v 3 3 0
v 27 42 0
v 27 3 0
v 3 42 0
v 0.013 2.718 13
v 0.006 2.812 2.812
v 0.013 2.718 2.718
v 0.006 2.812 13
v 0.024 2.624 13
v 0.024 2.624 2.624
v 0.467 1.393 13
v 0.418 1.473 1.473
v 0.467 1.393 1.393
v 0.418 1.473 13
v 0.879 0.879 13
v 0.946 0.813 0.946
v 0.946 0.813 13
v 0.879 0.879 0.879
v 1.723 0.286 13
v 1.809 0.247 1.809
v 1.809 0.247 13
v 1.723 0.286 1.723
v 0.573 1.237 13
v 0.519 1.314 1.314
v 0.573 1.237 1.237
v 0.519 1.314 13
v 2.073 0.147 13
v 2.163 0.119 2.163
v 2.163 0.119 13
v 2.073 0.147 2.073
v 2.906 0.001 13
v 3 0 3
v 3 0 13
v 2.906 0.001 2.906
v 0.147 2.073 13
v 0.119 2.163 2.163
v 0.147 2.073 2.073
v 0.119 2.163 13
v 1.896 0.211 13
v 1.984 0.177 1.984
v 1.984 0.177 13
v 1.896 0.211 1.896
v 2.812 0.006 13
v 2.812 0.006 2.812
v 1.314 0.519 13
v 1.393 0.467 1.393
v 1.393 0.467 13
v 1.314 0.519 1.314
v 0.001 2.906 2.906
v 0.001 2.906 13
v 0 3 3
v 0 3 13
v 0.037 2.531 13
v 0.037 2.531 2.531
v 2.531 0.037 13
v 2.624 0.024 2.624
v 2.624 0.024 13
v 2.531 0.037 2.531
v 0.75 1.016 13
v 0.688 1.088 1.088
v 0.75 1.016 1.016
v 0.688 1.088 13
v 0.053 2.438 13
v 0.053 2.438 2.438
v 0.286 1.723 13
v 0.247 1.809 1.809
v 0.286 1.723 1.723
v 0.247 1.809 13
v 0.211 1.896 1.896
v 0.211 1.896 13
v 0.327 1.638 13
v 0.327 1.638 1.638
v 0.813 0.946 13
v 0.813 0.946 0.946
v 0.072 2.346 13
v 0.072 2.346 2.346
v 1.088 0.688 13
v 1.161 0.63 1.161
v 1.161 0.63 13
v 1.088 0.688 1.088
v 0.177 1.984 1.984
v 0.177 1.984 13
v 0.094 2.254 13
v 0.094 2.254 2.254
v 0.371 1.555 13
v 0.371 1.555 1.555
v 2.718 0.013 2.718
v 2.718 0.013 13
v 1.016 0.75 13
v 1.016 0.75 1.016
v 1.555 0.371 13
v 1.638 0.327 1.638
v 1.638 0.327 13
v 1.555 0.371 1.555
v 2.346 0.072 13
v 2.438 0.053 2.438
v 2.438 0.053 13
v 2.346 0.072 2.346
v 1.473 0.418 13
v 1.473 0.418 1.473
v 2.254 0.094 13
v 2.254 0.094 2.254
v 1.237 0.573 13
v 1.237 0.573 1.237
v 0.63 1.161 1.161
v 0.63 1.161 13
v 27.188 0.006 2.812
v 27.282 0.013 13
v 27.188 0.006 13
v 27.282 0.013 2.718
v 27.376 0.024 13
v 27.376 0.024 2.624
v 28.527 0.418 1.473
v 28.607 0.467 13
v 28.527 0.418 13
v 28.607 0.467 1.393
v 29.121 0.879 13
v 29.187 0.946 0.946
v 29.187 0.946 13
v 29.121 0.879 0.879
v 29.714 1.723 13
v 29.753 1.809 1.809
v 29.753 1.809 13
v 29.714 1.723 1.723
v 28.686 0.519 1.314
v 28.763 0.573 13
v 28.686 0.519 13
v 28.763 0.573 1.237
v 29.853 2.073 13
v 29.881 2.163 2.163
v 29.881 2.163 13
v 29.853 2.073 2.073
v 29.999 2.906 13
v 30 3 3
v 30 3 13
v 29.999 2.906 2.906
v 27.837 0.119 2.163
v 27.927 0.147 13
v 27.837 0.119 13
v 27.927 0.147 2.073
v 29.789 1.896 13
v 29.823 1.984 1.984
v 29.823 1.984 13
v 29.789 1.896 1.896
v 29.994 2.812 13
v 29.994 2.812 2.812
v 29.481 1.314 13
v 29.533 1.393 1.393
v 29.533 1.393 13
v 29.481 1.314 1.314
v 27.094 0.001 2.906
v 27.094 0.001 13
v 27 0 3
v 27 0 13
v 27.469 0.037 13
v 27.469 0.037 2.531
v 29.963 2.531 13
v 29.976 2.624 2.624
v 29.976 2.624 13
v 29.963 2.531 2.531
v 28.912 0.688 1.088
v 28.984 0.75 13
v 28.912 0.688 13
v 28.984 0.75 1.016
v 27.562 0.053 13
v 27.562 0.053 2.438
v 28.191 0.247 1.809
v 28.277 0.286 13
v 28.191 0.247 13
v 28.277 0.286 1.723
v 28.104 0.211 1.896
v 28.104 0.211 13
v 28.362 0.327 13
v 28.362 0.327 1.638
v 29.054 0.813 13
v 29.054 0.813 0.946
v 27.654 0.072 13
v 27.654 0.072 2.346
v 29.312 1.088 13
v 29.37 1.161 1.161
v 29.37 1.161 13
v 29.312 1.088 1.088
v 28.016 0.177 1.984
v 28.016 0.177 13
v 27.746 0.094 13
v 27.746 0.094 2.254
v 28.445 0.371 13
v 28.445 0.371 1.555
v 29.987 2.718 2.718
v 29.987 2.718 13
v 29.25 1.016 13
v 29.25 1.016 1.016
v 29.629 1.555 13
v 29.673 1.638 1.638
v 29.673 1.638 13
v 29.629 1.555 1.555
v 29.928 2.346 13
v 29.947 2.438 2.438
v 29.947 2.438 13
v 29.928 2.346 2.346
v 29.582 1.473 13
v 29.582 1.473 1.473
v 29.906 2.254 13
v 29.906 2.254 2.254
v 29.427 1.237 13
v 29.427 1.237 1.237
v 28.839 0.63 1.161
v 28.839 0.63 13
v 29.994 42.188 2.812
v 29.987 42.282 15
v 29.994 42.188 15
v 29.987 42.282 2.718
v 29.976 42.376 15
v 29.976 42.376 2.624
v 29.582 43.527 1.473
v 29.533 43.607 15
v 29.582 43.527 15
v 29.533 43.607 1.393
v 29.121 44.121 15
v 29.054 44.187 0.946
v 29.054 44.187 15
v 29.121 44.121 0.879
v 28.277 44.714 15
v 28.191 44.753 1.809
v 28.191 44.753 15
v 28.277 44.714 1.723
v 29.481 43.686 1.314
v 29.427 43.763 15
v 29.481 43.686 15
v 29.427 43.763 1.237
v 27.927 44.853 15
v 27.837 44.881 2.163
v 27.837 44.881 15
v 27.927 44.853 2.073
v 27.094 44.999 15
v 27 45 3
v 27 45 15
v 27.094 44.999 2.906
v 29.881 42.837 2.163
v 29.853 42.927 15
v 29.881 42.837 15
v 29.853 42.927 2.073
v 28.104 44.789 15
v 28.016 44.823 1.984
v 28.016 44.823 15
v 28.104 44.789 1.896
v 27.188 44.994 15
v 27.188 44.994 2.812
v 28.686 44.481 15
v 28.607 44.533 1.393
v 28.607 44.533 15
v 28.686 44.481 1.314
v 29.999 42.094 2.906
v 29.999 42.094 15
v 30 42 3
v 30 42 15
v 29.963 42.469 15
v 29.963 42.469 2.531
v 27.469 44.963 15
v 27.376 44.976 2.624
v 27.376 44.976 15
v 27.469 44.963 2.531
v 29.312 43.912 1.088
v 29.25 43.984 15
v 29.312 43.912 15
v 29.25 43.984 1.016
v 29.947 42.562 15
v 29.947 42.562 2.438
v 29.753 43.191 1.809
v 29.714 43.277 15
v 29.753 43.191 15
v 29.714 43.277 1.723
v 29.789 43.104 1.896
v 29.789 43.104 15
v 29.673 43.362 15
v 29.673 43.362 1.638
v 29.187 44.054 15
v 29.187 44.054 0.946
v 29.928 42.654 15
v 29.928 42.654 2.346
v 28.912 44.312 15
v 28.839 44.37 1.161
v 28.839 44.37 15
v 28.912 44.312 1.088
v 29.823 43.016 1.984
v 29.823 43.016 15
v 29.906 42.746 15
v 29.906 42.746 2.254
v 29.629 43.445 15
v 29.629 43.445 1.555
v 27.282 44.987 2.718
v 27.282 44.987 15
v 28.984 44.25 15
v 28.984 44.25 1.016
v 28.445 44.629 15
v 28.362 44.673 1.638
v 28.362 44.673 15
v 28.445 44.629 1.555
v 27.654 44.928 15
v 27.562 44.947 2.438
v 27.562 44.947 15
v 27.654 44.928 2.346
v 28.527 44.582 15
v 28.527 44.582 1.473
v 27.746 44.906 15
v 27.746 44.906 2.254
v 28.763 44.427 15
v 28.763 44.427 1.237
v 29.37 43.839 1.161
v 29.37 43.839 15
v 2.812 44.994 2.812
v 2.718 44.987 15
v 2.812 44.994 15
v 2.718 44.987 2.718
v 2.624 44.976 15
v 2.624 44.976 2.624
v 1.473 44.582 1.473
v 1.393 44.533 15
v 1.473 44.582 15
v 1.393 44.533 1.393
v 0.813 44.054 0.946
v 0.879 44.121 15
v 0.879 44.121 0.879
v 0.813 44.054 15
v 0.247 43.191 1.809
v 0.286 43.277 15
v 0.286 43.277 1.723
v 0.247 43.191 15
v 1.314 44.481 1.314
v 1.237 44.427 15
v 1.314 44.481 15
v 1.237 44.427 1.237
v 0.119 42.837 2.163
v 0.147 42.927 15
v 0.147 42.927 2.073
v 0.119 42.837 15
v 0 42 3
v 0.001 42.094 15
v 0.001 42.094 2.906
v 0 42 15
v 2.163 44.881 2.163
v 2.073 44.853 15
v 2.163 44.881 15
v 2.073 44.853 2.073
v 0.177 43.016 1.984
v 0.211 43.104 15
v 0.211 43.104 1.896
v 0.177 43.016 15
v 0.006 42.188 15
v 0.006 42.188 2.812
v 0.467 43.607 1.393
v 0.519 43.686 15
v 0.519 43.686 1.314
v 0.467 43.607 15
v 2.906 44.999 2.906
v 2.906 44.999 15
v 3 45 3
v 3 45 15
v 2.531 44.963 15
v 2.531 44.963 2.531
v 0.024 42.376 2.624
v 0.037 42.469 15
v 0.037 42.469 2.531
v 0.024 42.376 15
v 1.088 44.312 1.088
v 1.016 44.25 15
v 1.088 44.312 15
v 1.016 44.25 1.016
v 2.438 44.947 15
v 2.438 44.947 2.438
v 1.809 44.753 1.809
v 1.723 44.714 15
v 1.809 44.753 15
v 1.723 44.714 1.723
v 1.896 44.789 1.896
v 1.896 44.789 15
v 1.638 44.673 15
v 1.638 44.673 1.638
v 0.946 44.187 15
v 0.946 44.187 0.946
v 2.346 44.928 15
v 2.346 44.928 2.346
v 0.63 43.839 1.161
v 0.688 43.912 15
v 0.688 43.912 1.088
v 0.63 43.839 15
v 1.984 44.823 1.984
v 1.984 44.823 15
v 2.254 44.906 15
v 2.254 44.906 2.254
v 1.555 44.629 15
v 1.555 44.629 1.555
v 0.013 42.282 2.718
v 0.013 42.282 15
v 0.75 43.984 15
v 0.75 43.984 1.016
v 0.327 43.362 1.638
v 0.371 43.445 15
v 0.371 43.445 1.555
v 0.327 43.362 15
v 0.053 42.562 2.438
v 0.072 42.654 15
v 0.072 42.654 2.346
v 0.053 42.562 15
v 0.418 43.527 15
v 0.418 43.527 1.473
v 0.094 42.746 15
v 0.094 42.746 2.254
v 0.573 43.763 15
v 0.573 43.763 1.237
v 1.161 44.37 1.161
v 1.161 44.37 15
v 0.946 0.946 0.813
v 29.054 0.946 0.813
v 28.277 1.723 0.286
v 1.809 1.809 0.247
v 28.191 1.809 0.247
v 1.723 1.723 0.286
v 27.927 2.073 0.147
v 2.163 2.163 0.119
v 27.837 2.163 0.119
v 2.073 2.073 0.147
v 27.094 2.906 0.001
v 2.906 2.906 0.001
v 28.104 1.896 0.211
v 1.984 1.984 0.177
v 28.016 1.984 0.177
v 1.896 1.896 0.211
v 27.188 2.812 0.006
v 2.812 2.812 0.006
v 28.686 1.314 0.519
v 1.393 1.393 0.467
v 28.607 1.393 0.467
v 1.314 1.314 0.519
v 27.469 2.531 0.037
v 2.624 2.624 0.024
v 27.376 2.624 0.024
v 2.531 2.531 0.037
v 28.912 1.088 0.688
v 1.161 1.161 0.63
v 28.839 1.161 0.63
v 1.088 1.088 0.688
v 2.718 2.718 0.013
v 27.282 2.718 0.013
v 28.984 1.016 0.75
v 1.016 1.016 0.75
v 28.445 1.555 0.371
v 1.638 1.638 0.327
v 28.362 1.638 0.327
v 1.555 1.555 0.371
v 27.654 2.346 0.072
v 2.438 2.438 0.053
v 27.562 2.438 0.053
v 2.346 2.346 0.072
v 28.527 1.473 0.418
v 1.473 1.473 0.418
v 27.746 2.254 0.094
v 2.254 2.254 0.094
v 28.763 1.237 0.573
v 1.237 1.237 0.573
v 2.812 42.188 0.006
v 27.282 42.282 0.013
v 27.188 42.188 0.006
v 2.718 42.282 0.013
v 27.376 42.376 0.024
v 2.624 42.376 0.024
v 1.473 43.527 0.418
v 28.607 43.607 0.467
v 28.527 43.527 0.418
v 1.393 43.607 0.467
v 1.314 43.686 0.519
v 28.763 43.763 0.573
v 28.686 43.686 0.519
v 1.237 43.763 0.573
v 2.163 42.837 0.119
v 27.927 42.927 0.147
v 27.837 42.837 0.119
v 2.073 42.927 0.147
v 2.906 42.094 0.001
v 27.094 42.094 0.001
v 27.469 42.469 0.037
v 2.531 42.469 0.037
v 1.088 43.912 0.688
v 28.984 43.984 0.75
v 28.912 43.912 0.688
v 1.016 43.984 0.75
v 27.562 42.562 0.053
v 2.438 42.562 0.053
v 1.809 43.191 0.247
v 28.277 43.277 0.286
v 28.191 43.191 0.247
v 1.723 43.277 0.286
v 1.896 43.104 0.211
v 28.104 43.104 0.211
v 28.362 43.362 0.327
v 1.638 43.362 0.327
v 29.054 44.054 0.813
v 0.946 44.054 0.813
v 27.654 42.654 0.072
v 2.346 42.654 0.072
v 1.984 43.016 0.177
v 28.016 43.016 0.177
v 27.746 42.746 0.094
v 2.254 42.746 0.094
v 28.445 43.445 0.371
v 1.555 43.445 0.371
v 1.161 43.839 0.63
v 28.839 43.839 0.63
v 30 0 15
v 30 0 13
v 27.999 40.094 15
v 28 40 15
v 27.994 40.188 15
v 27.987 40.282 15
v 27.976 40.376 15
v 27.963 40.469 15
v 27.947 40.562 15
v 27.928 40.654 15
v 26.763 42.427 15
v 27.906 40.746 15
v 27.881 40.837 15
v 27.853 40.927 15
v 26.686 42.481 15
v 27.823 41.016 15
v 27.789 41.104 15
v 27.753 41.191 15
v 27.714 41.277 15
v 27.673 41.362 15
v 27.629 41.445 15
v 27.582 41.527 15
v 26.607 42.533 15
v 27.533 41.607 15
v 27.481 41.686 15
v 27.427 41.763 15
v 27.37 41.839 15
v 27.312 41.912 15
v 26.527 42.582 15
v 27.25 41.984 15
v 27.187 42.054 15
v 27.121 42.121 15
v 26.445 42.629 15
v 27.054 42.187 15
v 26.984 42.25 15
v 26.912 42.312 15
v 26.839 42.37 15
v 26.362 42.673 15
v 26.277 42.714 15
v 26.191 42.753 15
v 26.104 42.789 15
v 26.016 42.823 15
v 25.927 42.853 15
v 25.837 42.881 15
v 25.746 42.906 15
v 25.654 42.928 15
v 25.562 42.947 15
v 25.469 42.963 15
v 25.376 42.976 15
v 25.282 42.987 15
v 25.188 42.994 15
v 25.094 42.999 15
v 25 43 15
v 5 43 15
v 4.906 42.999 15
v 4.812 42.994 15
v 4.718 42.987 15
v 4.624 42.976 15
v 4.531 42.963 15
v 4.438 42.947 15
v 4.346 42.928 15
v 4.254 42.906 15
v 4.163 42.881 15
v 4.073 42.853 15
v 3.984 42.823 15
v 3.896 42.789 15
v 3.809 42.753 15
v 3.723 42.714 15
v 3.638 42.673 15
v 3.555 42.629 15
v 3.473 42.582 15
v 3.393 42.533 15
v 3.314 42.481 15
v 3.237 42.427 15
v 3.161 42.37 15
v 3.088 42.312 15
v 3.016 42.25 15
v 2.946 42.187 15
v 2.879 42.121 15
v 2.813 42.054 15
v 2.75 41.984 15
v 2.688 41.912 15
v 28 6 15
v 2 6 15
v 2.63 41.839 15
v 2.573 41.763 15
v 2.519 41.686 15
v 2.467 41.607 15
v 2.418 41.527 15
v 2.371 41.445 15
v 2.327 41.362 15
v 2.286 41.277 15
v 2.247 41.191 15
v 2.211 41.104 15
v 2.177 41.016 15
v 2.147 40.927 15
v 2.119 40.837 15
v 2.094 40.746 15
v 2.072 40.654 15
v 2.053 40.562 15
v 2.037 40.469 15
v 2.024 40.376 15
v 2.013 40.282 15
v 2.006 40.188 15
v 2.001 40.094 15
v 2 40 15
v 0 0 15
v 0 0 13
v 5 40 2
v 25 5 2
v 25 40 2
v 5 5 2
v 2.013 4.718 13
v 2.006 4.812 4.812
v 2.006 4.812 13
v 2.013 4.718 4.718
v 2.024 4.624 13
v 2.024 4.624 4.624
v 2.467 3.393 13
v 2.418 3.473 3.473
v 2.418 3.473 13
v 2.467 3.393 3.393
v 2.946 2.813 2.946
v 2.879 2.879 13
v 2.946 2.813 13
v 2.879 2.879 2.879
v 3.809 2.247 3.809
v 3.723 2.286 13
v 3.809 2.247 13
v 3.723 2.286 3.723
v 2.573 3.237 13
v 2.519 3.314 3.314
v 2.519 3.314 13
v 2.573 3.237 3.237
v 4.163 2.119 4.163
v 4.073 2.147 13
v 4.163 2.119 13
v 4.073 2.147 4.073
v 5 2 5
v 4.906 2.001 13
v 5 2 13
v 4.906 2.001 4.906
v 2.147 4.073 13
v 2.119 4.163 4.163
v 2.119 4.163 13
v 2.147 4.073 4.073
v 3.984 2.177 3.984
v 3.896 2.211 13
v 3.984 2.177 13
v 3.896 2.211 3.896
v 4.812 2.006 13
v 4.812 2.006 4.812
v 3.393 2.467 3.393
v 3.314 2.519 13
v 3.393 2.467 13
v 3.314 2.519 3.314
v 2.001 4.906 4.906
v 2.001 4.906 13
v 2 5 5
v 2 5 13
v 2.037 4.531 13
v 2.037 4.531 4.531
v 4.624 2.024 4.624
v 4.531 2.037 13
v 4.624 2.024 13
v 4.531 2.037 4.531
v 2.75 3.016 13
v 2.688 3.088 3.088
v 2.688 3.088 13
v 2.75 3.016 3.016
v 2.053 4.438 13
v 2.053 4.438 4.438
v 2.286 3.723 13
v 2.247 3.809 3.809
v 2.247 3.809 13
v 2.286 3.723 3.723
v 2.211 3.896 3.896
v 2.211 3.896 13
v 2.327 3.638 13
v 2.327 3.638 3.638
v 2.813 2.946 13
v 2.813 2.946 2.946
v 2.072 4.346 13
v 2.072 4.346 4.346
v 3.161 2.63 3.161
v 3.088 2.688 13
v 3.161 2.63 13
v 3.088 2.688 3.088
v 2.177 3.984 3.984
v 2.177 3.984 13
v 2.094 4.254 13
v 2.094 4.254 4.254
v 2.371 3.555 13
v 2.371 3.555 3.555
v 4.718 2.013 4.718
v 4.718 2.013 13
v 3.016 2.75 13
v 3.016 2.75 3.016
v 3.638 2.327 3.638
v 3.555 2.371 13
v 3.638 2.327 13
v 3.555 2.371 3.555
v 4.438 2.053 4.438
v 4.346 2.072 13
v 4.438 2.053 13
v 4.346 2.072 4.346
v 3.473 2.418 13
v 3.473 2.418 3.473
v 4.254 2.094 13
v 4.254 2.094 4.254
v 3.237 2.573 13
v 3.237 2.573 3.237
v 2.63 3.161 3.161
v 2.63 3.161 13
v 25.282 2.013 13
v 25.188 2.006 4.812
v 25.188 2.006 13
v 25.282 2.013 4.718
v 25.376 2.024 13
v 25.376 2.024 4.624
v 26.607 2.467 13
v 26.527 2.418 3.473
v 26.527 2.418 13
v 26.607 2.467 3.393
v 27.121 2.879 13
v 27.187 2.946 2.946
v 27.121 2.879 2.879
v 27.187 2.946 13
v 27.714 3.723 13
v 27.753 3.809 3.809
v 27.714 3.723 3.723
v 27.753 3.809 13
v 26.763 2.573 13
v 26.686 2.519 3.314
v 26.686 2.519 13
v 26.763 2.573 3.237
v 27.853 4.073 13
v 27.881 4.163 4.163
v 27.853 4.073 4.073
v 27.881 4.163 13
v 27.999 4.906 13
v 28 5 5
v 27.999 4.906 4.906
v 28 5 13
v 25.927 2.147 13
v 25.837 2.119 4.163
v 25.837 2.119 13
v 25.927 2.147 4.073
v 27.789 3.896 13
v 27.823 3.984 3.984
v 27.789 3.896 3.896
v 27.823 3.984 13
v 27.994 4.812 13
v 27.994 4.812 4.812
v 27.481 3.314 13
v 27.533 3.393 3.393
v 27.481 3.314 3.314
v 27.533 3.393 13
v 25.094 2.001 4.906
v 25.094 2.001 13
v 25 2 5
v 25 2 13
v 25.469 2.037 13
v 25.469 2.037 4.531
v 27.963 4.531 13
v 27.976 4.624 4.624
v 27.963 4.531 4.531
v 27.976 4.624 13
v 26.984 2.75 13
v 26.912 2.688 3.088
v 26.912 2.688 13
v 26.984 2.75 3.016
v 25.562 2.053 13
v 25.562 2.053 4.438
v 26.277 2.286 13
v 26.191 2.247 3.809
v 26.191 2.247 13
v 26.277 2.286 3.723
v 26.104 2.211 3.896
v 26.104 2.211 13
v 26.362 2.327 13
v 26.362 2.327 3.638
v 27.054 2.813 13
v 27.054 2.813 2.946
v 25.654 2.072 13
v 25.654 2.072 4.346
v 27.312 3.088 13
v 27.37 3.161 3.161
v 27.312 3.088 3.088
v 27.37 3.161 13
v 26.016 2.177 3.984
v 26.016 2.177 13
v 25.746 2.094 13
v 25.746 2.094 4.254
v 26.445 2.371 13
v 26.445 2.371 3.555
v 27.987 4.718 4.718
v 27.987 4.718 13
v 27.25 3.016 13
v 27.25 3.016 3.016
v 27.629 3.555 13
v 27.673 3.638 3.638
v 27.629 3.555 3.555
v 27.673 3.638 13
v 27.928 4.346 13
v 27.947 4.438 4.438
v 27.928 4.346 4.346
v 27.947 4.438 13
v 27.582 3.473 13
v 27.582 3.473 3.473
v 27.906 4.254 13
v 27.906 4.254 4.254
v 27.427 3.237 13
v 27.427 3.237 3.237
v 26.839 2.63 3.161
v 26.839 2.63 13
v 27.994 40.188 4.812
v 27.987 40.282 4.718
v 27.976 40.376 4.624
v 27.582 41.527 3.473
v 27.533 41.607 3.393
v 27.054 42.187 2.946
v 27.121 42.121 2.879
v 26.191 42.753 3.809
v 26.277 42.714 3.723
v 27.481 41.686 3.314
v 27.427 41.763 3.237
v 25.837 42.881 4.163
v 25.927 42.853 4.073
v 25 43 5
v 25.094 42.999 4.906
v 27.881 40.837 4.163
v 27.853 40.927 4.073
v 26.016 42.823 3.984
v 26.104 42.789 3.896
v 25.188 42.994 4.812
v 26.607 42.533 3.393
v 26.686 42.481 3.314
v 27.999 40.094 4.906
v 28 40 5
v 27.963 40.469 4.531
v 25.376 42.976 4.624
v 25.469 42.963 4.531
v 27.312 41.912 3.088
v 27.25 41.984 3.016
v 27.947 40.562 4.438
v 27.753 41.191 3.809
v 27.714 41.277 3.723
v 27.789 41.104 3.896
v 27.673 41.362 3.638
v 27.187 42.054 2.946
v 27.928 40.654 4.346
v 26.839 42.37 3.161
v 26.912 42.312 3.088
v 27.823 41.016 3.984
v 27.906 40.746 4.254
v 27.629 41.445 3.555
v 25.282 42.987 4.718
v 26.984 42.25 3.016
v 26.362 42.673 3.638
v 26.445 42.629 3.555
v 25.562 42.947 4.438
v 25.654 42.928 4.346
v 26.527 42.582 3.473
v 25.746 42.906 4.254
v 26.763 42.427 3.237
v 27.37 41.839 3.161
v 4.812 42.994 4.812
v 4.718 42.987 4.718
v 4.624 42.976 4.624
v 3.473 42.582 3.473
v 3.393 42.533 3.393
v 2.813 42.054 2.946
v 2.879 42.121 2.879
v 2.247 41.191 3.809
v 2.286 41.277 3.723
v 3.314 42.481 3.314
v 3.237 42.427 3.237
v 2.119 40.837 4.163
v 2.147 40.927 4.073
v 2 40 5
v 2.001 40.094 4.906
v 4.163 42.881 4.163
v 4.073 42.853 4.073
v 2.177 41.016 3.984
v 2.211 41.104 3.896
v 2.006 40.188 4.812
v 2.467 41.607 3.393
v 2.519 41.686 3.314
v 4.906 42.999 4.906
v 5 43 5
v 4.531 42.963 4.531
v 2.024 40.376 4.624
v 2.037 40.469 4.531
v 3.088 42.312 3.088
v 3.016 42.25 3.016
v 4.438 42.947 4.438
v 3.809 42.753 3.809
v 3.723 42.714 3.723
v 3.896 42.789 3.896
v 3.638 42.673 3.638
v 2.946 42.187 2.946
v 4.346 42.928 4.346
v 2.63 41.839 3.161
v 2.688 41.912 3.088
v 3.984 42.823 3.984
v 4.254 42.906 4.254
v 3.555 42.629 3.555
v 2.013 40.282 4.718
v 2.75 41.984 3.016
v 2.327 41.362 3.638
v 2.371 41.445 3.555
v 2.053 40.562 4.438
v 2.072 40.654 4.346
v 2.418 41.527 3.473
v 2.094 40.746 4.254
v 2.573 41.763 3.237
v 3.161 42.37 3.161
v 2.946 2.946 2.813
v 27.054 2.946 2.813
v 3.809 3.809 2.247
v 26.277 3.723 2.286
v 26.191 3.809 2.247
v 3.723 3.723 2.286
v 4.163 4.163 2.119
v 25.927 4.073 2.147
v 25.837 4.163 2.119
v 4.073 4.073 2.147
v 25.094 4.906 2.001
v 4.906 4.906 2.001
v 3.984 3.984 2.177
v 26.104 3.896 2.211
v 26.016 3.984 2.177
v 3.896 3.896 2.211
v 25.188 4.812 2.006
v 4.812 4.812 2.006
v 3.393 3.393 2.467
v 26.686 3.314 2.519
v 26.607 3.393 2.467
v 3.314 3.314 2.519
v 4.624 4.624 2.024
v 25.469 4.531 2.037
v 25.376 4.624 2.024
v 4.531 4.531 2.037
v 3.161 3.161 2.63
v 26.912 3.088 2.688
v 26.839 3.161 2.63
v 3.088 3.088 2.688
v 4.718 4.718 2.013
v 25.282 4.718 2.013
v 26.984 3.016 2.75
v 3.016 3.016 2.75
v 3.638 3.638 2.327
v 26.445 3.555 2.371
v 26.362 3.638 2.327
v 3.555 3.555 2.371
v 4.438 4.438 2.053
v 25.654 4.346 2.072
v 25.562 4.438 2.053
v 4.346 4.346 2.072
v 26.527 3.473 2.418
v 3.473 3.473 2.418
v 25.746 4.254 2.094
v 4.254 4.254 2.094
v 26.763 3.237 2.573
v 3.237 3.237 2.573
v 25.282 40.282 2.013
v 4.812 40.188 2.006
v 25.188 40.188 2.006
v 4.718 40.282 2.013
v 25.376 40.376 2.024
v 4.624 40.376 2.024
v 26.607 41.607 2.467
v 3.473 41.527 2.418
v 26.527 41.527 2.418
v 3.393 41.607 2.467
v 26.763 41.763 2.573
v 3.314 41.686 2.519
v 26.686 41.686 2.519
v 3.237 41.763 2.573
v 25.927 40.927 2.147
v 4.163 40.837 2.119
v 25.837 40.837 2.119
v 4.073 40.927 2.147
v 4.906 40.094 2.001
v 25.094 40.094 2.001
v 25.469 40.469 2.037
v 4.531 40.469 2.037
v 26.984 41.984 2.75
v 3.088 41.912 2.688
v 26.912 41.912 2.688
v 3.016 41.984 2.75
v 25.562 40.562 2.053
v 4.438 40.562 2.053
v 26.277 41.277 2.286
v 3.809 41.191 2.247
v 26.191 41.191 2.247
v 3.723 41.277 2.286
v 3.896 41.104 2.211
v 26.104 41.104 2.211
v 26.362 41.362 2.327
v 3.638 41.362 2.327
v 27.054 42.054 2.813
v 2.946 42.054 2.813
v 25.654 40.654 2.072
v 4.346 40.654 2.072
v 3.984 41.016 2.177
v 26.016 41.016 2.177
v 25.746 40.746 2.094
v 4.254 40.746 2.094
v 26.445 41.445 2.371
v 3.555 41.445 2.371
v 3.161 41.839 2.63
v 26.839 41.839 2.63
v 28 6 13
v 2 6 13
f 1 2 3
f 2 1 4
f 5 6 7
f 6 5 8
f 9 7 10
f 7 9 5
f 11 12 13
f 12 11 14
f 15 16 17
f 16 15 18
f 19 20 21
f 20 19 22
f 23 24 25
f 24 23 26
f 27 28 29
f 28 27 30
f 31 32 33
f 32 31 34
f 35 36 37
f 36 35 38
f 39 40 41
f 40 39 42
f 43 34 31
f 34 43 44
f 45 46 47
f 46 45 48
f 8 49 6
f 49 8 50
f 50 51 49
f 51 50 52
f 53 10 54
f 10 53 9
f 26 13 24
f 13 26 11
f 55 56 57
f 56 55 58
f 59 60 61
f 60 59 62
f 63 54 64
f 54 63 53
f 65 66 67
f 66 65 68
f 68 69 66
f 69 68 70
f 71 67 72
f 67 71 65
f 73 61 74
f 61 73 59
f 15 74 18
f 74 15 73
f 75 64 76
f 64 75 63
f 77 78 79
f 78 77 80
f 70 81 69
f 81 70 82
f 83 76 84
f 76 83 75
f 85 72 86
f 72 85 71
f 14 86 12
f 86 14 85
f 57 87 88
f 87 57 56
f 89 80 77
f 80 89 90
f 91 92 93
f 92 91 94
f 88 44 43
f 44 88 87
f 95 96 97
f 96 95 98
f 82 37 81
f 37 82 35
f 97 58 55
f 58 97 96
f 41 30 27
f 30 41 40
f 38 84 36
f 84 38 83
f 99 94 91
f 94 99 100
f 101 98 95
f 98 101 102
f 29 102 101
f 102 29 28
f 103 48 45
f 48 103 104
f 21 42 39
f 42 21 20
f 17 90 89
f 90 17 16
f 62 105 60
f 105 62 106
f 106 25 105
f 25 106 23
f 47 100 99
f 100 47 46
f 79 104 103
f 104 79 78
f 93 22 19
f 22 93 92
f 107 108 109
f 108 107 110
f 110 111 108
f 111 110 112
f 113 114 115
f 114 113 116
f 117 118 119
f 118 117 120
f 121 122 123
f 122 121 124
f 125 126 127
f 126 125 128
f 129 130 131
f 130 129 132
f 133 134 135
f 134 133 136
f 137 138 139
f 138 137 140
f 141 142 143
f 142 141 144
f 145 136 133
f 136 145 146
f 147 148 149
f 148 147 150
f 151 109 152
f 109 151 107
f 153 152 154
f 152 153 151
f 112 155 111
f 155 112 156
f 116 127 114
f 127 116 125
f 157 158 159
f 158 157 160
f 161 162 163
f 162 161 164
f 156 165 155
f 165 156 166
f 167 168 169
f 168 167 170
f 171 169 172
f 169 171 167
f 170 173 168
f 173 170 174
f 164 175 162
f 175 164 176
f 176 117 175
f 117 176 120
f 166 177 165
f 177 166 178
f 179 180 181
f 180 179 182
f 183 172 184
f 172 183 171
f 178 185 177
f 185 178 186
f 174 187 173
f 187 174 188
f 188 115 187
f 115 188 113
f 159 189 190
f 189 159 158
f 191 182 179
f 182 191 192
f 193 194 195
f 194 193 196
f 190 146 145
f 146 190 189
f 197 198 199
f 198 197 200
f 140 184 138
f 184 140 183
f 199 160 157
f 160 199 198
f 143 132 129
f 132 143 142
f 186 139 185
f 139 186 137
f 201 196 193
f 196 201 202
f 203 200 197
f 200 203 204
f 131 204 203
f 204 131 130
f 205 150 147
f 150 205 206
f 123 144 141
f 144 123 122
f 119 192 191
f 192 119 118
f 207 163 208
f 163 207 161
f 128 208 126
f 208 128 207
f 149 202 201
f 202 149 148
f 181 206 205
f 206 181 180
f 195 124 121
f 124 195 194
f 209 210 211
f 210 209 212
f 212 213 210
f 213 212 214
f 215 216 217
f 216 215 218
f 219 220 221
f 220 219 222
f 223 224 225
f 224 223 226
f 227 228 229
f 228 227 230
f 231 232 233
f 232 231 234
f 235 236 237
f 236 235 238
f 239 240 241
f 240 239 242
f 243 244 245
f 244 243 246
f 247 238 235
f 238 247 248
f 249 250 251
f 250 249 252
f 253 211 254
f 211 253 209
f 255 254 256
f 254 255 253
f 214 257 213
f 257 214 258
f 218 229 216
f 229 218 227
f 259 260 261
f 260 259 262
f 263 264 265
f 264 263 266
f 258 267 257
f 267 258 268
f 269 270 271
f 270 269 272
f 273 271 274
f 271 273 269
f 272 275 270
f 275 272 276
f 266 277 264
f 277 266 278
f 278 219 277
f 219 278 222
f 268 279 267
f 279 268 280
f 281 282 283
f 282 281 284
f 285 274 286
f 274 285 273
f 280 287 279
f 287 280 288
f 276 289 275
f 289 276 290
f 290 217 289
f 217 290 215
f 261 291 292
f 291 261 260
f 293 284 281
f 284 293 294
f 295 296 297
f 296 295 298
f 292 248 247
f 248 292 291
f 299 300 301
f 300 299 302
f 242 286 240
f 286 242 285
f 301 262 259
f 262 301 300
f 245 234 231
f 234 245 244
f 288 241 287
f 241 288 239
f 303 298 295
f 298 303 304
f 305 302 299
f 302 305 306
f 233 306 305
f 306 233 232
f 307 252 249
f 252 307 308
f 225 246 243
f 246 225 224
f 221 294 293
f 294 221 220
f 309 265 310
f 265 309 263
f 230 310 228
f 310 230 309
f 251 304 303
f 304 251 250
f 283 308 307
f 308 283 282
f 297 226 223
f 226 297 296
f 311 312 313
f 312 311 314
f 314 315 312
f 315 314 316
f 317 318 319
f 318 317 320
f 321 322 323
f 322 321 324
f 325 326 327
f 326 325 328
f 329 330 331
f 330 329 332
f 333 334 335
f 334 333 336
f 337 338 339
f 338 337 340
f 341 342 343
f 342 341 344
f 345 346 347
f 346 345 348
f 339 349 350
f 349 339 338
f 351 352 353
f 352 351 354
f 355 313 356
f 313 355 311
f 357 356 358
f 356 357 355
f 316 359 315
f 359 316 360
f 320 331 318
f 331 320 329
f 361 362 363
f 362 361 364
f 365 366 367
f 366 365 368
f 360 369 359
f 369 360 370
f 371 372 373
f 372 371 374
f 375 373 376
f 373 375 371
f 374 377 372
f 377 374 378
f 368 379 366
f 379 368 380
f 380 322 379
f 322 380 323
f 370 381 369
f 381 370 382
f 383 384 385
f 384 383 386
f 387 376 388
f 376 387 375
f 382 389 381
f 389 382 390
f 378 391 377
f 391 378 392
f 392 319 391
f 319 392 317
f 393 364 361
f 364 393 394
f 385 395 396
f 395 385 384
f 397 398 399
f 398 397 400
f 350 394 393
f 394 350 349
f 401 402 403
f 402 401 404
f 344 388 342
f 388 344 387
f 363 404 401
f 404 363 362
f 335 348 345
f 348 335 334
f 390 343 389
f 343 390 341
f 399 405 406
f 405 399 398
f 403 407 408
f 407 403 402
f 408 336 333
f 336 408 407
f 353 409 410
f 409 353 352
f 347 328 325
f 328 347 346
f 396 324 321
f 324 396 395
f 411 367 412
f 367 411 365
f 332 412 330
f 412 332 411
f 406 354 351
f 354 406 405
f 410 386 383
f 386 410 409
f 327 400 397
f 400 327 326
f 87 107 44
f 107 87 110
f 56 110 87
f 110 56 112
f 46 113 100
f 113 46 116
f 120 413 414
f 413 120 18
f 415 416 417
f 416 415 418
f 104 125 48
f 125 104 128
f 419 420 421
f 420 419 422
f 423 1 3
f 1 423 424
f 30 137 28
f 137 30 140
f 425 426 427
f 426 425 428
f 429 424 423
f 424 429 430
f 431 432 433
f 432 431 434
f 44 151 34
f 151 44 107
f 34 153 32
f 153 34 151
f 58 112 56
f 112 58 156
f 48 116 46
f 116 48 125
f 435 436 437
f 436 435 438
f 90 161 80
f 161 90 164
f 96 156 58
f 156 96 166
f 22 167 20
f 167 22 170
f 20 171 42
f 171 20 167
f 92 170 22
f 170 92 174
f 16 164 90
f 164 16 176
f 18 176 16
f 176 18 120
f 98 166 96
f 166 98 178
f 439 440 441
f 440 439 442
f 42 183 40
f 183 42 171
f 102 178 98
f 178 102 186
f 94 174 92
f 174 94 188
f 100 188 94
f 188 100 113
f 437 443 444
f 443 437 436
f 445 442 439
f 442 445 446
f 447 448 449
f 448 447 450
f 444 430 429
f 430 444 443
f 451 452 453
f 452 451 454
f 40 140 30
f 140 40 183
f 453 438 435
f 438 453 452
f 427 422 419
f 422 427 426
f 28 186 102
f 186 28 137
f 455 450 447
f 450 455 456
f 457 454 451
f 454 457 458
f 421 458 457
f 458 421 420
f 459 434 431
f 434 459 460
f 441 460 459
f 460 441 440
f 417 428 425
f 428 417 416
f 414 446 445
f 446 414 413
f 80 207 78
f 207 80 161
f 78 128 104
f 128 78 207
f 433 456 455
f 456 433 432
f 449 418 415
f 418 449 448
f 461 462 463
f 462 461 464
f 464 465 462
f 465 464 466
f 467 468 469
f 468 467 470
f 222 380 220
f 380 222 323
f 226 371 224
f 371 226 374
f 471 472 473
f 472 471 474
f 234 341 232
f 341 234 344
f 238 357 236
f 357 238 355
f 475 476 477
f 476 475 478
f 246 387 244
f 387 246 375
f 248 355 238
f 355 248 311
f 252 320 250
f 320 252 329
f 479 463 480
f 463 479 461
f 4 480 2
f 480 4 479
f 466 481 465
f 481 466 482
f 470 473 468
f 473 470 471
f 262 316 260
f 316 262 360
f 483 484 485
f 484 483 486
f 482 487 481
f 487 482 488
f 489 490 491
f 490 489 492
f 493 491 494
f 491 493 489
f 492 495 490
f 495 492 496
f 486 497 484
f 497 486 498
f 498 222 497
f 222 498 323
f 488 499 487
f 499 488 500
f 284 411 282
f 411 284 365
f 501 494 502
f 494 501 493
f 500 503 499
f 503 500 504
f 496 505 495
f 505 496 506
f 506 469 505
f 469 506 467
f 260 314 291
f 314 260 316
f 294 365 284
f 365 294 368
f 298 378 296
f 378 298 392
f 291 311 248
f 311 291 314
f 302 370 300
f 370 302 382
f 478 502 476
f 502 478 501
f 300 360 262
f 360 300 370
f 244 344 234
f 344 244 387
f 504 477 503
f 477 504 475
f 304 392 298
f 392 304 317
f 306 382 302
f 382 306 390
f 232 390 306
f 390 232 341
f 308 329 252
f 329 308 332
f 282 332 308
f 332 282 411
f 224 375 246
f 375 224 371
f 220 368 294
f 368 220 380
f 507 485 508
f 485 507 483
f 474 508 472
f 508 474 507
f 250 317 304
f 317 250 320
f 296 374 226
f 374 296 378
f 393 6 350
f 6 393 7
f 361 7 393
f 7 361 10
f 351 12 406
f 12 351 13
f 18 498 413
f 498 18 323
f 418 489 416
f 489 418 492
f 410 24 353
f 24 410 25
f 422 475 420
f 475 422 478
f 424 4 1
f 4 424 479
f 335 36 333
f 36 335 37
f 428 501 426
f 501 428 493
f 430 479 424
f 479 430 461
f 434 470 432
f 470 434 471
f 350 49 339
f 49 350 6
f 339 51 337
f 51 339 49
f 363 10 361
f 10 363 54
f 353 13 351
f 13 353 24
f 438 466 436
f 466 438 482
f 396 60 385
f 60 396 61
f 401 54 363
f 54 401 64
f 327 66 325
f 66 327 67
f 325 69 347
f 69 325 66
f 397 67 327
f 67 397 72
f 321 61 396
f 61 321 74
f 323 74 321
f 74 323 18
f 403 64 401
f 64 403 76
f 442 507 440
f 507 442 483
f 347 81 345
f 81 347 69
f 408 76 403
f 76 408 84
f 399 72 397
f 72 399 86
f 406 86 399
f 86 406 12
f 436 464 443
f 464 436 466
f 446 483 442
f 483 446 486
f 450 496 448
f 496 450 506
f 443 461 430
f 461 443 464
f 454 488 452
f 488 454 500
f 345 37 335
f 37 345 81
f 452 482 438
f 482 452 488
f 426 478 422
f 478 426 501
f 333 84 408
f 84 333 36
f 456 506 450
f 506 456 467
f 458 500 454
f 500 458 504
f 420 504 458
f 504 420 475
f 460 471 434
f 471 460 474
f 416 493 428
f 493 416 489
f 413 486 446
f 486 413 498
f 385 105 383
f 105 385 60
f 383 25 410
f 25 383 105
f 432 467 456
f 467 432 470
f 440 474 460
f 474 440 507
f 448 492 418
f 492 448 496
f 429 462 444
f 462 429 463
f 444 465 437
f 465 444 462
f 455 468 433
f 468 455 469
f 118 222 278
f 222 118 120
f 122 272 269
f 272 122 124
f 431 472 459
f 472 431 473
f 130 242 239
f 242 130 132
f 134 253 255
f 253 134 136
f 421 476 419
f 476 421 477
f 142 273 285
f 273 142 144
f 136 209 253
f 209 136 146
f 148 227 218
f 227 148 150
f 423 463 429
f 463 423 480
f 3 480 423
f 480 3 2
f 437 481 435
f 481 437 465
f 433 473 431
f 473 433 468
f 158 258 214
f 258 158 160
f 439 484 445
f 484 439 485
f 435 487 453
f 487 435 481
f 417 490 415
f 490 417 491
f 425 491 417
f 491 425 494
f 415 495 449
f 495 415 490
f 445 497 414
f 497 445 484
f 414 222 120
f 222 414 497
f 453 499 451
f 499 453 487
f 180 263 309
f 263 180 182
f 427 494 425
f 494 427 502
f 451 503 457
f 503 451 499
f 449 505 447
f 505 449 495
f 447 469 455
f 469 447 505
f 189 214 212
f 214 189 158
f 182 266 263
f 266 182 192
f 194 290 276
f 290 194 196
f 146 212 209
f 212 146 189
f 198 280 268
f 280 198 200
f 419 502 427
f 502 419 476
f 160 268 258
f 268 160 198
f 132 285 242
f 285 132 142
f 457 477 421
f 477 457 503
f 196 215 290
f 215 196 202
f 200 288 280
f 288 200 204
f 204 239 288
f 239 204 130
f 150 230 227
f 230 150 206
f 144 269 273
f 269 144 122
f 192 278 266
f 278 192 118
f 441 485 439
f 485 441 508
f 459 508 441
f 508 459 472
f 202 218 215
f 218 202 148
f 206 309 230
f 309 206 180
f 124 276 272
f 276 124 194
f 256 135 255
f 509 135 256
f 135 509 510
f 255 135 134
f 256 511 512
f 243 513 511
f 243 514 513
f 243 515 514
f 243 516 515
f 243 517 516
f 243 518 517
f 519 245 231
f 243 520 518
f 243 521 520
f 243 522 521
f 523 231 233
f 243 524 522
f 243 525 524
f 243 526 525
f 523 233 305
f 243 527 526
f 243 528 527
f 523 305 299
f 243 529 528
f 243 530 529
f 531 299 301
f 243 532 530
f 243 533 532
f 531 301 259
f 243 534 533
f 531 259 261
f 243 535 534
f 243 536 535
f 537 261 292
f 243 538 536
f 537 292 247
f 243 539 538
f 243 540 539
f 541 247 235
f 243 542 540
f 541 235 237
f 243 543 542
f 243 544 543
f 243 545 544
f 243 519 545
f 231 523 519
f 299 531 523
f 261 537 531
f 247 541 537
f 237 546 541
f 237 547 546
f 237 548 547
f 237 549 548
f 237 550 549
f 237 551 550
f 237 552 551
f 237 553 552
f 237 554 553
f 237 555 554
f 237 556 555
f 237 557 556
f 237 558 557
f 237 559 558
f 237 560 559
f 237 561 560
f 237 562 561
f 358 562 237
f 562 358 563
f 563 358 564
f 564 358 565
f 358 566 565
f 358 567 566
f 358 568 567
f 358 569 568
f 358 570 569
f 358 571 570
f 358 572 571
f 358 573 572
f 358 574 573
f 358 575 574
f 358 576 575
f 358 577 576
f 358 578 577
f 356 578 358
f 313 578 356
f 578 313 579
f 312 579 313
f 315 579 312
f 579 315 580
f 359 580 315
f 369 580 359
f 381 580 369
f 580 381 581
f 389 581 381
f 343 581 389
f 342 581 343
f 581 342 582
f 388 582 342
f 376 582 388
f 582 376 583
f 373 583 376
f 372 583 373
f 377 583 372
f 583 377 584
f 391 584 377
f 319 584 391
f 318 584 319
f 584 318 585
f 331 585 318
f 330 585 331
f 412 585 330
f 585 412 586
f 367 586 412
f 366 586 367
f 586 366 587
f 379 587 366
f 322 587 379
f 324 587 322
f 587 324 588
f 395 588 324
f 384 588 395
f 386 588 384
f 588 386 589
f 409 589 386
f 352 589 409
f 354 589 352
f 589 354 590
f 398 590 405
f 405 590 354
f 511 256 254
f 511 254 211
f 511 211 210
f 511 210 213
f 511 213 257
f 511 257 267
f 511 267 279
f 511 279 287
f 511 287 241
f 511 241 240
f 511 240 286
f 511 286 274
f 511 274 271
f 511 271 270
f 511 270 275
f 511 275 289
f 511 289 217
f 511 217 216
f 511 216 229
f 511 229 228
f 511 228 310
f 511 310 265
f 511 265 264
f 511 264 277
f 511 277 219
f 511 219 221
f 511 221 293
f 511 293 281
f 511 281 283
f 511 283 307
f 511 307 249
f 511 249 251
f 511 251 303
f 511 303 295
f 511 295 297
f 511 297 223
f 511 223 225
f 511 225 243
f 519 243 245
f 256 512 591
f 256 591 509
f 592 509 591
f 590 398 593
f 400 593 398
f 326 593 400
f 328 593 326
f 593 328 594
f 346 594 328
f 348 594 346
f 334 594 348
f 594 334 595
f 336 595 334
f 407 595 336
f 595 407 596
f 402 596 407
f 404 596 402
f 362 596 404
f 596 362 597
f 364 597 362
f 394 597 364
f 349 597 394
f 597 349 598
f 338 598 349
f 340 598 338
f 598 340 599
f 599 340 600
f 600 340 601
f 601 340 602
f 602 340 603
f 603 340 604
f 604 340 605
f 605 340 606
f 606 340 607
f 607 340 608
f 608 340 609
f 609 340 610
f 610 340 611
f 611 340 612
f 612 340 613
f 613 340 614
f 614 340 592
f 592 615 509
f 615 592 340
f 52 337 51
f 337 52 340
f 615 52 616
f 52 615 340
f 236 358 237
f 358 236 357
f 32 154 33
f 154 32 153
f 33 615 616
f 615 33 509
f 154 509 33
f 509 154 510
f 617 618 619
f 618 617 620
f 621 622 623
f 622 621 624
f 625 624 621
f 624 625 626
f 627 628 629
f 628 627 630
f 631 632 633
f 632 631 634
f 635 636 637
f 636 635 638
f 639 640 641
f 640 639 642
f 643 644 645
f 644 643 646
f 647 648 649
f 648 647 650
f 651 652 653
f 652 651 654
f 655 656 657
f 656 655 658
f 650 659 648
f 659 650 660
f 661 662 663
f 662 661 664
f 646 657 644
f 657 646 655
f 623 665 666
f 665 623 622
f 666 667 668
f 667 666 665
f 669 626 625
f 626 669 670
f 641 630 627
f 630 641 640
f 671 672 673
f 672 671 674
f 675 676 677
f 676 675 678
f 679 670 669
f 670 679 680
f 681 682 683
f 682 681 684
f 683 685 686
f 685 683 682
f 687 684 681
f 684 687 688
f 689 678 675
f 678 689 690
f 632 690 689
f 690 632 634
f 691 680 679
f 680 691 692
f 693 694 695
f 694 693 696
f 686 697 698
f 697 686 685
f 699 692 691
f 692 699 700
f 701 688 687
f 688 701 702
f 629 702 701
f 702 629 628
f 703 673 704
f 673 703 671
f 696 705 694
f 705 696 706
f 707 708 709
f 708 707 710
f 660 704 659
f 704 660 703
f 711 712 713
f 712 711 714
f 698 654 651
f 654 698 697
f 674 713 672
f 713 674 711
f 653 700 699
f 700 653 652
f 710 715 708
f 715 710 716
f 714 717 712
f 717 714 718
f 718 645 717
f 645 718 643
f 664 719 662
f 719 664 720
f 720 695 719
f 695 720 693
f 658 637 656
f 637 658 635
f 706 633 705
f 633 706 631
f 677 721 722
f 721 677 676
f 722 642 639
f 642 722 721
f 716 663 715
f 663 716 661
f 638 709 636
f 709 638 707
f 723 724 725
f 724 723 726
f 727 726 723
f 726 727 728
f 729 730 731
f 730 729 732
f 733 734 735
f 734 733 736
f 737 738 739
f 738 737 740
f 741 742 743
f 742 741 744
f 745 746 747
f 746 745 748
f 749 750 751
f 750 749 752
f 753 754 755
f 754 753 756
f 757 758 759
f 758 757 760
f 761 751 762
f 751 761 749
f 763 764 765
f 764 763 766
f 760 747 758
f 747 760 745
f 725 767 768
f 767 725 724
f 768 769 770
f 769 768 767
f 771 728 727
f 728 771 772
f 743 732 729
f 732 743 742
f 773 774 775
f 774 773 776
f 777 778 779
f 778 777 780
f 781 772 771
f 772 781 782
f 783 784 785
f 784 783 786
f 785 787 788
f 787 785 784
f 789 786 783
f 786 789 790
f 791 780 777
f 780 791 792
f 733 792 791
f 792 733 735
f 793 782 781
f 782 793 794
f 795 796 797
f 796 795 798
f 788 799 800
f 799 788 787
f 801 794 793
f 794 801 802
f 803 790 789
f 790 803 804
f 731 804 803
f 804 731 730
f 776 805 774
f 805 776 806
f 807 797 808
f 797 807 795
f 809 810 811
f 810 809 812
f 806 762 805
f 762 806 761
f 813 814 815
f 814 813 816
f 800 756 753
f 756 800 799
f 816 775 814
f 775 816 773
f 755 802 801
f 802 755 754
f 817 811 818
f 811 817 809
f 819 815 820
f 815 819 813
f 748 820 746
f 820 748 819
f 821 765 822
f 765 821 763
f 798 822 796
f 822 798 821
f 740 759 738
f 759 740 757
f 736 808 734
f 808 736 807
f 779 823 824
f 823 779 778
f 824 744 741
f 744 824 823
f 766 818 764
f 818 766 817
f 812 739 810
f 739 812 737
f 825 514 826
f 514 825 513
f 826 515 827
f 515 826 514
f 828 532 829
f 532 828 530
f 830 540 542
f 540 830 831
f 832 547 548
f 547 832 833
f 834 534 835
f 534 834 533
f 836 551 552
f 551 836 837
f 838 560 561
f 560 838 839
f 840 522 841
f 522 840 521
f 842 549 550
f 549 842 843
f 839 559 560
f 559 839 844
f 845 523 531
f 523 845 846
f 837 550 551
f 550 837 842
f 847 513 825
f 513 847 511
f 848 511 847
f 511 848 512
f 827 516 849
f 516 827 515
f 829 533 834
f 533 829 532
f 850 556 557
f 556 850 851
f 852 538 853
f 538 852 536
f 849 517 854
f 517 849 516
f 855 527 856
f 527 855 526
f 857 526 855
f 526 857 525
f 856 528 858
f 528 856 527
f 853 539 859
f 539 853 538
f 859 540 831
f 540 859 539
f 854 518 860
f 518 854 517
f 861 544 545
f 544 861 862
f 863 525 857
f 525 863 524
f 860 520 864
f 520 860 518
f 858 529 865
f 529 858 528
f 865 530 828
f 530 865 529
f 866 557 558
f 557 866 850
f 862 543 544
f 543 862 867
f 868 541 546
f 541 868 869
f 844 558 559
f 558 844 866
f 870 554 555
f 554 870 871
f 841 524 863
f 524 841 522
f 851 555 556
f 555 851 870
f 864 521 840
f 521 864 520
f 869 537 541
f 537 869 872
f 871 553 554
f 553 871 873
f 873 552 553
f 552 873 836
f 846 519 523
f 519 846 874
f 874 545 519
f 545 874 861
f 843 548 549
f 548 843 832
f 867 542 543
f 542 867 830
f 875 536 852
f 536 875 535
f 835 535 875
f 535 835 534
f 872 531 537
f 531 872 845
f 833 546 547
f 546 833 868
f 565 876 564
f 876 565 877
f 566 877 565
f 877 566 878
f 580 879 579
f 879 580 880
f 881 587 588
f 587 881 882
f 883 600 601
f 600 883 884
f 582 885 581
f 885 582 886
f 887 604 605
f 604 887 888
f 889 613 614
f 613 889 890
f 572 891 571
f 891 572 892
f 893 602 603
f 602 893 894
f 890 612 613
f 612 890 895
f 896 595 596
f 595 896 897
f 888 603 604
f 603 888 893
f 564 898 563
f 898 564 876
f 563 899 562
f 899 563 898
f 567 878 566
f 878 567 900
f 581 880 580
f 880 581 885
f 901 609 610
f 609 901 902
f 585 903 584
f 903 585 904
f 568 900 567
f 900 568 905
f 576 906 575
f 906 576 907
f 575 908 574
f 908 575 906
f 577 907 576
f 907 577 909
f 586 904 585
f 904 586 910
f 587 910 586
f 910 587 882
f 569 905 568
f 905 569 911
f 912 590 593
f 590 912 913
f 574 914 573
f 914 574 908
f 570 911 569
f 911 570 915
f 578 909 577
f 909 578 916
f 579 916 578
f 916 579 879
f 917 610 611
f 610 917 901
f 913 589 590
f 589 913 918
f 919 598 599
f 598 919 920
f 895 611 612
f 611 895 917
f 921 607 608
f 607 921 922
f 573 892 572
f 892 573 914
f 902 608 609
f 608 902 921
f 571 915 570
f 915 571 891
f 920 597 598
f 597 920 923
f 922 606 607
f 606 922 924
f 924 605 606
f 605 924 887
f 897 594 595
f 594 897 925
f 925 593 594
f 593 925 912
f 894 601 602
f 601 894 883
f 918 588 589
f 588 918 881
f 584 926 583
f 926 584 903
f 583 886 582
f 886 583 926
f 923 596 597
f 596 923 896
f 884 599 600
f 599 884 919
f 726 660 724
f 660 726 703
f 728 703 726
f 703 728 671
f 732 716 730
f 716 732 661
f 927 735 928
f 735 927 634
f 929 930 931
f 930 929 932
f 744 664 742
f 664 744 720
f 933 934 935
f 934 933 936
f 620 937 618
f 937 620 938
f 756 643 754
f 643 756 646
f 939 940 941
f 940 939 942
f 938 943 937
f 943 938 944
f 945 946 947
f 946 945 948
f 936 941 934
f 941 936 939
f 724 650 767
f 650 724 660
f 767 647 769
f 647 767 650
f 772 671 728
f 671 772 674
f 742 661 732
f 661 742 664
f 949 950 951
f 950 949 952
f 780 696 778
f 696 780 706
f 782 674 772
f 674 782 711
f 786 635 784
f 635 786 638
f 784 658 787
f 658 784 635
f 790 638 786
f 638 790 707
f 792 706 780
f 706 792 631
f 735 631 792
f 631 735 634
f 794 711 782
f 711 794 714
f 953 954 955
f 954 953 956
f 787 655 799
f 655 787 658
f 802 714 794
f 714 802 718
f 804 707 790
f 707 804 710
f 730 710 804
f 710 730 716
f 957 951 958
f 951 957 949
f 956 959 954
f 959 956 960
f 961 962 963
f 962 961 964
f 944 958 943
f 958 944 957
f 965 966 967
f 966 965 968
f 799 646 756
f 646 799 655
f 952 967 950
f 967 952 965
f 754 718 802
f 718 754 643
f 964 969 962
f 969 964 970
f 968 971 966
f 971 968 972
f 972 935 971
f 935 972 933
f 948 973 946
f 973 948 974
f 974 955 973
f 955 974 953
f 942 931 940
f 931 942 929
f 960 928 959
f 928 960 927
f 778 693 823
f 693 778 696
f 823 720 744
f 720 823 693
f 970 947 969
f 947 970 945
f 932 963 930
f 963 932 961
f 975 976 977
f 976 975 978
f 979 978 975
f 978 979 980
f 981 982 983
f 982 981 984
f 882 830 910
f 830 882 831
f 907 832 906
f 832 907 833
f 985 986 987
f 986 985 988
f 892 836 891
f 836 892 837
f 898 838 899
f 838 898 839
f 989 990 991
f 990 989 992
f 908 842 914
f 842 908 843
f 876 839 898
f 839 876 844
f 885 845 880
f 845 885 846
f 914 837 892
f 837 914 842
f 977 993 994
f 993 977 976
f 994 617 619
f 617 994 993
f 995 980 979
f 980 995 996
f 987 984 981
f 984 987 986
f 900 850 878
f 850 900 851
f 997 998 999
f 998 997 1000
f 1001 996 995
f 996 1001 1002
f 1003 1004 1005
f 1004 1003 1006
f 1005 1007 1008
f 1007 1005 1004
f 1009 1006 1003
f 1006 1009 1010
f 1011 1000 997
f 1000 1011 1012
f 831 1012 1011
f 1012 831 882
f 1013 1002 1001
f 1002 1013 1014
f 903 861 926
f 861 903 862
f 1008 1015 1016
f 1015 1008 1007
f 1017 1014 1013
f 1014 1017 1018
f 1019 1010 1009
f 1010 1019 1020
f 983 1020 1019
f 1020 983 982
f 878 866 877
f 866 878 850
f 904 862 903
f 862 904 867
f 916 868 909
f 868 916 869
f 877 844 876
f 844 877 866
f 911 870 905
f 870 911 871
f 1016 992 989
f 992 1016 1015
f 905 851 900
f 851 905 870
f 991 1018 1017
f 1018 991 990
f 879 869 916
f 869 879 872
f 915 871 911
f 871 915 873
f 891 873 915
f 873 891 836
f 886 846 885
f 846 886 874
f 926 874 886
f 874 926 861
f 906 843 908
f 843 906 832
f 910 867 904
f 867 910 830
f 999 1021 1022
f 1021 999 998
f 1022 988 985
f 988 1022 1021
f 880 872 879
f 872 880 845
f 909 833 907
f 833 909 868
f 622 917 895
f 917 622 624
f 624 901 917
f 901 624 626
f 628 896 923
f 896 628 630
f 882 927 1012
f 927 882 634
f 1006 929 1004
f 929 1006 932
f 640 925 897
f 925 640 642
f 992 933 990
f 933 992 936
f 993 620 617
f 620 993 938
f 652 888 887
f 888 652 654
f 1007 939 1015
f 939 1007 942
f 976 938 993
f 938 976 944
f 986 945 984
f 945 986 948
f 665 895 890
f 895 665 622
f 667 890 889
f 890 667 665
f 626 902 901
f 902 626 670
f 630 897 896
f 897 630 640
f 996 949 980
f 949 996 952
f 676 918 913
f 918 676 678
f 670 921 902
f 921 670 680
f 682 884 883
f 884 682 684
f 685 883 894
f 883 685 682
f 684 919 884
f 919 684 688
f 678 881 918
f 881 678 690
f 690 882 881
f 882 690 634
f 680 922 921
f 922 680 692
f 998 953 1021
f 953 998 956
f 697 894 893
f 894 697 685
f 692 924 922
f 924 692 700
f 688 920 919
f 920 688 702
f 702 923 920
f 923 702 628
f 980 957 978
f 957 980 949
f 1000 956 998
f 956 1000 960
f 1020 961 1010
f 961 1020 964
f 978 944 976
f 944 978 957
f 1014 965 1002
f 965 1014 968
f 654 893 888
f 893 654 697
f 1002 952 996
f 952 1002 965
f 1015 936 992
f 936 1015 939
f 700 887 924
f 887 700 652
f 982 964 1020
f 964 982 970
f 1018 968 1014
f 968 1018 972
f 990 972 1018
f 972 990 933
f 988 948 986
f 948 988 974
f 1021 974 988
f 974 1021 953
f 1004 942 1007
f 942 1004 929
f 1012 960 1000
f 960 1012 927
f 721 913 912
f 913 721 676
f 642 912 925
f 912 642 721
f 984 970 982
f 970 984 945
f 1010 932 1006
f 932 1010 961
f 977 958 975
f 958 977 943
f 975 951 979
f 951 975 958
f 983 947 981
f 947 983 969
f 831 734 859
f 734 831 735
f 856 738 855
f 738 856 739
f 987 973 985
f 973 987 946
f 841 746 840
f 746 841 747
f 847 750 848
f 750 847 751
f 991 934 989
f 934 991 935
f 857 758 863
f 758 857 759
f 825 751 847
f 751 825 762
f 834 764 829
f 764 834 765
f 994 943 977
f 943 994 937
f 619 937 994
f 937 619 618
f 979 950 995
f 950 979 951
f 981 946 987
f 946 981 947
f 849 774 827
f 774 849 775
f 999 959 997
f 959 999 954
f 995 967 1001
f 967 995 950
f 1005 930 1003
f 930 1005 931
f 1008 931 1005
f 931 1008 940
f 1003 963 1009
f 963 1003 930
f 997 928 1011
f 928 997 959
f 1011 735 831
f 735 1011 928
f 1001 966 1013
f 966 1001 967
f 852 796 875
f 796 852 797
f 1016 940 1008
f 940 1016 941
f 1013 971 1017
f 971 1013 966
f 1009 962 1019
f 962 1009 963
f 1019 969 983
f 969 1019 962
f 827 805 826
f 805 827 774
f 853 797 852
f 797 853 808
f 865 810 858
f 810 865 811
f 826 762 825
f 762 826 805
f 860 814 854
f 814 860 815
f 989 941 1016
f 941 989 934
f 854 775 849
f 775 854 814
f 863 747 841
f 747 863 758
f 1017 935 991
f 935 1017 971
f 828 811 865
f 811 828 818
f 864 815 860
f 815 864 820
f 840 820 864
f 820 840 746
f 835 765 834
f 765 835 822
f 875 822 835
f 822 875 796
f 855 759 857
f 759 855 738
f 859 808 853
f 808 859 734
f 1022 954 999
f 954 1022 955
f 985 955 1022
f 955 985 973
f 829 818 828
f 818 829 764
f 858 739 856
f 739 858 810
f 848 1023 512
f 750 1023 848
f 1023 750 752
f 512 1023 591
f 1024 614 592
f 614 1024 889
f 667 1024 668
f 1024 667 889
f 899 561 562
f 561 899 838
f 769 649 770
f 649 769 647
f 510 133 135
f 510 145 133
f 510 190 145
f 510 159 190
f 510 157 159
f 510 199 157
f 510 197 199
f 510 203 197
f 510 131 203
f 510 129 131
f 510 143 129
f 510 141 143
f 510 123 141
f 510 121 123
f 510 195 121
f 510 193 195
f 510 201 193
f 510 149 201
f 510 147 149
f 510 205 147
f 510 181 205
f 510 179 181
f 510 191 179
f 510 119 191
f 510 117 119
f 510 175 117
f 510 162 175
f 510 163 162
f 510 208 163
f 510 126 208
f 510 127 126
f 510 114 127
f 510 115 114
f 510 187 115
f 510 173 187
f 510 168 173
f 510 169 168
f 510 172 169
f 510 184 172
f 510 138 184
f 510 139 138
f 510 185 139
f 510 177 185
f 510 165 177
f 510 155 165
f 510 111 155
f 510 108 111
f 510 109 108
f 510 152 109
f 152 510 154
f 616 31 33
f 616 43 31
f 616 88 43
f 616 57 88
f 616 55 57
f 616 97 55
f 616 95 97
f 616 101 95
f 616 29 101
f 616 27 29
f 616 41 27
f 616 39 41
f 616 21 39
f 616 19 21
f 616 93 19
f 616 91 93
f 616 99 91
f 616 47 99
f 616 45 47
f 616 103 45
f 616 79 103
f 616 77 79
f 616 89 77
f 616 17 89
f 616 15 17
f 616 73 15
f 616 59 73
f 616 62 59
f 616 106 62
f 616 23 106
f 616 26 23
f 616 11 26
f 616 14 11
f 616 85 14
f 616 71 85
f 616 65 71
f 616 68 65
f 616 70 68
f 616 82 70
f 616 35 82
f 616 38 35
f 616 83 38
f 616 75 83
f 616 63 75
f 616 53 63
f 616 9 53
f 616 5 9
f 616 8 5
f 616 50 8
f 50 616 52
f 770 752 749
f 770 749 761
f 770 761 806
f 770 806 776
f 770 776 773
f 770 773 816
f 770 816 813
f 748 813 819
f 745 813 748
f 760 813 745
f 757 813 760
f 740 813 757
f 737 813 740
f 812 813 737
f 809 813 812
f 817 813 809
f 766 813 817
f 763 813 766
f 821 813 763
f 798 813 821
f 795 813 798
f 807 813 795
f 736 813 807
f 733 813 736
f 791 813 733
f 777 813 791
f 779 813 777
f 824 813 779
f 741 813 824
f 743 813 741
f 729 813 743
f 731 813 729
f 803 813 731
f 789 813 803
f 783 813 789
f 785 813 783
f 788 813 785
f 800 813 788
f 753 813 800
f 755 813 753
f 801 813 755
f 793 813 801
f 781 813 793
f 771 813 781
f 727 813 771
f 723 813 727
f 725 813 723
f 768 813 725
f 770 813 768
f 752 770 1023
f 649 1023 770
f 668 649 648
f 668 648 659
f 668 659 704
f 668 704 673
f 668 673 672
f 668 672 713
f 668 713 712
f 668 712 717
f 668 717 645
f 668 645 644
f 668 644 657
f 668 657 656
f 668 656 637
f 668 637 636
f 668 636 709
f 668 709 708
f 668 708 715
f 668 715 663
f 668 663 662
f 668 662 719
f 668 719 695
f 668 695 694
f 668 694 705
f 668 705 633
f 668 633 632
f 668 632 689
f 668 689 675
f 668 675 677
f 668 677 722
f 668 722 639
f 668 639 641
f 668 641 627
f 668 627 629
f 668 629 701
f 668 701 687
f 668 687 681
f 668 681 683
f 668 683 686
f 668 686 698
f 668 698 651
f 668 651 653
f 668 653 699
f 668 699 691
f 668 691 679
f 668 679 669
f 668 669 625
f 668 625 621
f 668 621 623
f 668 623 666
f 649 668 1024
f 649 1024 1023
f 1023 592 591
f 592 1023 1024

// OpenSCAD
$fn=200;

length = 45;
width = 30;
height = 15;
cornerRadius = 3;
thickness = 2;
lipDepth = 6;
dividerHeight = 0; //height - thickness;

translate([0, 0, 0]) {
    box(length, width, height, cornerRadius, thickness, lipDepth, dividerHeight);
}

module box(length, width, height, radius, thickness, lipDepth, dividerHeight) {
    thickness2 = 2*thickness;
    union(){
        difference() {
            boxpart(length, width, height, radius);
            translate([thickness, thickness, thickness]) 
              boxpart(length-thickness2, width-thickness2, height-thickness+0.01, radius);
        }
        if (lipDepth > 0) {
            translate([0, 0, height-thickness]) cube([width, lipDepth, thickness]);
        }
        if (dividerHeight > 0) {
            translate([0, length/2, thickness]) cube([width-thickness, thickness, dividerHeight]);
        }
    }
}

module boxpart(length, width, height, radius) {
    difference() {
        cube(size=[width, length, height]);
        // The intersection of these will give corners which are imperfect,
        // but good enough.
        rounderZ(length, width, height+0.2, radius);
        rounderXL(length, width, height, radius);
        rounderYL(length, width, height, radius);
    }
}

module rounderZ(length, width, height, radius) {
    rounder2(height, radius, width);
    translate([width, length, 0]) rotate([0, 0, 180]) rounder2(height, radius, width);
}

module rounderXL(length, width, height, radius) {
    rotate([90, 0, 90]) rounder2(width, radius, length);
}

module rounderYL(length, width, height, radius) {
    translate([0, length, 0]) rotate([90, 0, 0]) rounder2(length, radius, width);
}

module rounder2(height, radius, spacing) {
    rounder(height, radius);
    translate([spacing, 0, 0]) rotate([0, 0, 90]) rounder(height, radius);
}

module rounder(height, radius) {
    slop = 0.2;
    difference() {
        translate([-radius, -radius, 0]) cube(size=[radius*2, radius*2, height]);
        translate([radius, radius, -slop/2]) cylinder(h=height+slop, r=radius, center=false);
    }
}
